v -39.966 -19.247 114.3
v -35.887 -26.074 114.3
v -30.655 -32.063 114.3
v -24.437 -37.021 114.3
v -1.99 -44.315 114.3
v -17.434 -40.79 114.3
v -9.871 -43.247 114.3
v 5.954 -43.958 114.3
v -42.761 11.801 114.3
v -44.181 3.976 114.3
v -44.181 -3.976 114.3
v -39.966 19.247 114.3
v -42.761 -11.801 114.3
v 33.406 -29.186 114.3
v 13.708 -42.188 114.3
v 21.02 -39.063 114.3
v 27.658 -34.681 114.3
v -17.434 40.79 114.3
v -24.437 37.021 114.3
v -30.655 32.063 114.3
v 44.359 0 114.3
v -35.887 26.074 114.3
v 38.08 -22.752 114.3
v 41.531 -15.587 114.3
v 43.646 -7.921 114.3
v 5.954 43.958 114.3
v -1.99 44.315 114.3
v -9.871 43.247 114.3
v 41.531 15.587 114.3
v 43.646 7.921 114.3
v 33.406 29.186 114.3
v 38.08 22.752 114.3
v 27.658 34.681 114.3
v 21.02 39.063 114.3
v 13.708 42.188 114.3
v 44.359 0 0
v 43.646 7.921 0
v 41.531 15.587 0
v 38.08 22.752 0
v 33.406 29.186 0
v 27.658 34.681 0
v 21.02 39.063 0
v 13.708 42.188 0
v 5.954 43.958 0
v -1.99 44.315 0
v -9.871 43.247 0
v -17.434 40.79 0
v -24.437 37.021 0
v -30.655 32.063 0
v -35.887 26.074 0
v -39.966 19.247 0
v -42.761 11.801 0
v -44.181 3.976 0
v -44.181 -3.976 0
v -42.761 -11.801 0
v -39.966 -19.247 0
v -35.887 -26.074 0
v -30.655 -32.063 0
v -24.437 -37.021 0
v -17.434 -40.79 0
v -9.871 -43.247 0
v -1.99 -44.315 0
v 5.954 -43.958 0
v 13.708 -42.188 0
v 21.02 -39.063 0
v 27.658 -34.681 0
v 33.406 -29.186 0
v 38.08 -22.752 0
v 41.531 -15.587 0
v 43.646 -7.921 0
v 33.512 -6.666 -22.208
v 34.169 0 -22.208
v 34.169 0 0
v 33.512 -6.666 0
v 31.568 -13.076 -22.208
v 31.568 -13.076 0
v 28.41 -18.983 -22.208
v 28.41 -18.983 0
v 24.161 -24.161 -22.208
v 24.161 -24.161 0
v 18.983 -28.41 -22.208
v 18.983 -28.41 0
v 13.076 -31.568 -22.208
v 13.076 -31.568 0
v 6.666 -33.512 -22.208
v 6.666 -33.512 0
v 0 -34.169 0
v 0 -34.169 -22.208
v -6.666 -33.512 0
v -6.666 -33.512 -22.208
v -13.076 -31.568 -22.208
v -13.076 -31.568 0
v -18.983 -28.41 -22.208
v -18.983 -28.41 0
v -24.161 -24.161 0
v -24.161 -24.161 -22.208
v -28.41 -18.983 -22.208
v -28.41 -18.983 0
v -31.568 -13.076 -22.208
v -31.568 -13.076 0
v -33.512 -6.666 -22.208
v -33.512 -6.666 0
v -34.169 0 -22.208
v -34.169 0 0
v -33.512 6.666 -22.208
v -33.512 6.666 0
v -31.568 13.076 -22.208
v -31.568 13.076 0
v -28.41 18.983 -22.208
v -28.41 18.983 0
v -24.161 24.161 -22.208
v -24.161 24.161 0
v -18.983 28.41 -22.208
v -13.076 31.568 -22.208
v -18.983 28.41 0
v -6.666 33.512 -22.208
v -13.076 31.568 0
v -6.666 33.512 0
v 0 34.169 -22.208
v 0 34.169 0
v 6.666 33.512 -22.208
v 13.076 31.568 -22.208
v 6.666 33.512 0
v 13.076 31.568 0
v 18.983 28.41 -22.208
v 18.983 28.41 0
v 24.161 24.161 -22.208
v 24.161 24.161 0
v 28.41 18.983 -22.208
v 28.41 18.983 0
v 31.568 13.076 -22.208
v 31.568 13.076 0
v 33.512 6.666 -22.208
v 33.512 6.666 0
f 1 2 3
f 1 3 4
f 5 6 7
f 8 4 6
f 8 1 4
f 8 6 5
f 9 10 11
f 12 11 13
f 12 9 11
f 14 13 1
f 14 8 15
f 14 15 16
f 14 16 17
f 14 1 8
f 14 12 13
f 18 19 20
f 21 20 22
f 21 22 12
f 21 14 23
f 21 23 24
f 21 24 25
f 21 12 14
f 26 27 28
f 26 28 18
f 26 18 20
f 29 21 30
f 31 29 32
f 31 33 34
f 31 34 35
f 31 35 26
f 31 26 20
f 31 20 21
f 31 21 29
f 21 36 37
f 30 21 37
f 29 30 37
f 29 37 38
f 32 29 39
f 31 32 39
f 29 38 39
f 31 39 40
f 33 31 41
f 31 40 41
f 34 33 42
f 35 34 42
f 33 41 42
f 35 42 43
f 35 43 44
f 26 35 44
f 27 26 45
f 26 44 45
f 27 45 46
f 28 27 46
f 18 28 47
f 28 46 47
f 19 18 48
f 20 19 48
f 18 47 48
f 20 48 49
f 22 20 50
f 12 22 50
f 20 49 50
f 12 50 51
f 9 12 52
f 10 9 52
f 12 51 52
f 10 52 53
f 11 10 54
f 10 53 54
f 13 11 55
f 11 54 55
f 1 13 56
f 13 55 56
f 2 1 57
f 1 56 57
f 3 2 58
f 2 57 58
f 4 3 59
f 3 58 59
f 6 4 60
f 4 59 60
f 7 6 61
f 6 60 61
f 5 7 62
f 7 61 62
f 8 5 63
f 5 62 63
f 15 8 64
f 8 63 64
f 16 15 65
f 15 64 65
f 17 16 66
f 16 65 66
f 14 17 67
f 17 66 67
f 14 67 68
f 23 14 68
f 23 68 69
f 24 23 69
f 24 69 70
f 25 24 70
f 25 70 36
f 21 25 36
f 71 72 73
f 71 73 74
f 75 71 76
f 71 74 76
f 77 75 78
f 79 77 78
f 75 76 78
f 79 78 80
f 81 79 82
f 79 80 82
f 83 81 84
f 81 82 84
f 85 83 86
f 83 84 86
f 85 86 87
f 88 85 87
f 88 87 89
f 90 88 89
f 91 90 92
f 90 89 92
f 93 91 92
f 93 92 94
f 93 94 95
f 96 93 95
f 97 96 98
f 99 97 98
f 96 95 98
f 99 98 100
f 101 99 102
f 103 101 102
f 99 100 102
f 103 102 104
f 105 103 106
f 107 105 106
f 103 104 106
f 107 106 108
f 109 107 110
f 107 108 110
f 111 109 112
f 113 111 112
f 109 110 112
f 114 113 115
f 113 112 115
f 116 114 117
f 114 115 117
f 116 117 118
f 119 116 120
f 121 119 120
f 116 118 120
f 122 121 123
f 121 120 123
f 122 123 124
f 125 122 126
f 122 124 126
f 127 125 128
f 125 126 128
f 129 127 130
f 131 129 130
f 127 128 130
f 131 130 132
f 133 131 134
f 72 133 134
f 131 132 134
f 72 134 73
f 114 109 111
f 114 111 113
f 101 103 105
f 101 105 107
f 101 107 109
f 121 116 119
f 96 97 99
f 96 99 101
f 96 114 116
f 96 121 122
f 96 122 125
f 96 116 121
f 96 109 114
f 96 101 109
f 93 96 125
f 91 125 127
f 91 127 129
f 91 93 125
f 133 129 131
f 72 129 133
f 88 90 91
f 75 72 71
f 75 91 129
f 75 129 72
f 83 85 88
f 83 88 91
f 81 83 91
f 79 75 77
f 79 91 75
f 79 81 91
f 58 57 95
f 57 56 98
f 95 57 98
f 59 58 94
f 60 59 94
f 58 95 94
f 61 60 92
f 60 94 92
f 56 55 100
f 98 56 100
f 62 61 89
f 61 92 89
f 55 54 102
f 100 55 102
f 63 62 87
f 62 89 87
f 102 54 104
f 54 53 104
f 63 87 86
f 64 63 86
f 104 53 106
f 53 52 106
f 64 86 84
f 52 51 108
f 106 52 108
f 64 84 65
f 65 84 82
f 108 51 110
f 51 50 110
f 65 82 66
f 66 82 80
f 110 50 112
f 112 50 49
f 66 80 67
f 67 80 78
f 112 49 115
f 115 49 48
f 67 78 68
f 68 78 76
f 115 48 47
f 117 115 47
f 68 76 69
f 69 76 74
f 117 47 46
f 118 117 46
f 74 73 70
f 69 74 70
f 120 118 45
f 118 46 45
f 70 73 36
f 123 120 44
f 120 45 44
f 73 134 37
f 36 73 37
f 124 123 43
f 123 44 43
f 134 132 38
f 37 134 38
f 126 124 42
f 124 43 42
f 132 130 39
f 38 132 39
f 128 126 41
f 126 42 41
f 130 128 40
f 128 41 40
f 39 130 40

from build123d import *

# Parameters (mm, degrees)
F0_R     = 44.359293
F1_DEPTH = 114.3
F2_R     = 34.168515
F3_DEPTH = 10.16
F4_R     = 34.168515
F5_DEPTH = 12.047837


with BuildPart() as f1:
    # F0 (on Top) → F1 (new body)
    with BuildSketch(Plane.XY):
        Circle(F0_R)
    extrude(amount=F1_DEPTH)

    # F2 (on face) → F3 (join)
    with BuildSketch(Plane(origin=(0, 0, 0), x_dir=(1, 0, 0), z_dir=(0, 0, -1))):
        Circle(F2_R)
    extrude(amount=F3_DEPTH)

    # F4 (on face) → F5 (join)
    with BuildSketch(Plane(origin=(0, 0, -10.16), x_dir=(1, 0, 0), z_dir=(0, 0, -1))):
        Circle(F4_R)
    extrude(amount=F5_DEPTH)


solid = f1.part
